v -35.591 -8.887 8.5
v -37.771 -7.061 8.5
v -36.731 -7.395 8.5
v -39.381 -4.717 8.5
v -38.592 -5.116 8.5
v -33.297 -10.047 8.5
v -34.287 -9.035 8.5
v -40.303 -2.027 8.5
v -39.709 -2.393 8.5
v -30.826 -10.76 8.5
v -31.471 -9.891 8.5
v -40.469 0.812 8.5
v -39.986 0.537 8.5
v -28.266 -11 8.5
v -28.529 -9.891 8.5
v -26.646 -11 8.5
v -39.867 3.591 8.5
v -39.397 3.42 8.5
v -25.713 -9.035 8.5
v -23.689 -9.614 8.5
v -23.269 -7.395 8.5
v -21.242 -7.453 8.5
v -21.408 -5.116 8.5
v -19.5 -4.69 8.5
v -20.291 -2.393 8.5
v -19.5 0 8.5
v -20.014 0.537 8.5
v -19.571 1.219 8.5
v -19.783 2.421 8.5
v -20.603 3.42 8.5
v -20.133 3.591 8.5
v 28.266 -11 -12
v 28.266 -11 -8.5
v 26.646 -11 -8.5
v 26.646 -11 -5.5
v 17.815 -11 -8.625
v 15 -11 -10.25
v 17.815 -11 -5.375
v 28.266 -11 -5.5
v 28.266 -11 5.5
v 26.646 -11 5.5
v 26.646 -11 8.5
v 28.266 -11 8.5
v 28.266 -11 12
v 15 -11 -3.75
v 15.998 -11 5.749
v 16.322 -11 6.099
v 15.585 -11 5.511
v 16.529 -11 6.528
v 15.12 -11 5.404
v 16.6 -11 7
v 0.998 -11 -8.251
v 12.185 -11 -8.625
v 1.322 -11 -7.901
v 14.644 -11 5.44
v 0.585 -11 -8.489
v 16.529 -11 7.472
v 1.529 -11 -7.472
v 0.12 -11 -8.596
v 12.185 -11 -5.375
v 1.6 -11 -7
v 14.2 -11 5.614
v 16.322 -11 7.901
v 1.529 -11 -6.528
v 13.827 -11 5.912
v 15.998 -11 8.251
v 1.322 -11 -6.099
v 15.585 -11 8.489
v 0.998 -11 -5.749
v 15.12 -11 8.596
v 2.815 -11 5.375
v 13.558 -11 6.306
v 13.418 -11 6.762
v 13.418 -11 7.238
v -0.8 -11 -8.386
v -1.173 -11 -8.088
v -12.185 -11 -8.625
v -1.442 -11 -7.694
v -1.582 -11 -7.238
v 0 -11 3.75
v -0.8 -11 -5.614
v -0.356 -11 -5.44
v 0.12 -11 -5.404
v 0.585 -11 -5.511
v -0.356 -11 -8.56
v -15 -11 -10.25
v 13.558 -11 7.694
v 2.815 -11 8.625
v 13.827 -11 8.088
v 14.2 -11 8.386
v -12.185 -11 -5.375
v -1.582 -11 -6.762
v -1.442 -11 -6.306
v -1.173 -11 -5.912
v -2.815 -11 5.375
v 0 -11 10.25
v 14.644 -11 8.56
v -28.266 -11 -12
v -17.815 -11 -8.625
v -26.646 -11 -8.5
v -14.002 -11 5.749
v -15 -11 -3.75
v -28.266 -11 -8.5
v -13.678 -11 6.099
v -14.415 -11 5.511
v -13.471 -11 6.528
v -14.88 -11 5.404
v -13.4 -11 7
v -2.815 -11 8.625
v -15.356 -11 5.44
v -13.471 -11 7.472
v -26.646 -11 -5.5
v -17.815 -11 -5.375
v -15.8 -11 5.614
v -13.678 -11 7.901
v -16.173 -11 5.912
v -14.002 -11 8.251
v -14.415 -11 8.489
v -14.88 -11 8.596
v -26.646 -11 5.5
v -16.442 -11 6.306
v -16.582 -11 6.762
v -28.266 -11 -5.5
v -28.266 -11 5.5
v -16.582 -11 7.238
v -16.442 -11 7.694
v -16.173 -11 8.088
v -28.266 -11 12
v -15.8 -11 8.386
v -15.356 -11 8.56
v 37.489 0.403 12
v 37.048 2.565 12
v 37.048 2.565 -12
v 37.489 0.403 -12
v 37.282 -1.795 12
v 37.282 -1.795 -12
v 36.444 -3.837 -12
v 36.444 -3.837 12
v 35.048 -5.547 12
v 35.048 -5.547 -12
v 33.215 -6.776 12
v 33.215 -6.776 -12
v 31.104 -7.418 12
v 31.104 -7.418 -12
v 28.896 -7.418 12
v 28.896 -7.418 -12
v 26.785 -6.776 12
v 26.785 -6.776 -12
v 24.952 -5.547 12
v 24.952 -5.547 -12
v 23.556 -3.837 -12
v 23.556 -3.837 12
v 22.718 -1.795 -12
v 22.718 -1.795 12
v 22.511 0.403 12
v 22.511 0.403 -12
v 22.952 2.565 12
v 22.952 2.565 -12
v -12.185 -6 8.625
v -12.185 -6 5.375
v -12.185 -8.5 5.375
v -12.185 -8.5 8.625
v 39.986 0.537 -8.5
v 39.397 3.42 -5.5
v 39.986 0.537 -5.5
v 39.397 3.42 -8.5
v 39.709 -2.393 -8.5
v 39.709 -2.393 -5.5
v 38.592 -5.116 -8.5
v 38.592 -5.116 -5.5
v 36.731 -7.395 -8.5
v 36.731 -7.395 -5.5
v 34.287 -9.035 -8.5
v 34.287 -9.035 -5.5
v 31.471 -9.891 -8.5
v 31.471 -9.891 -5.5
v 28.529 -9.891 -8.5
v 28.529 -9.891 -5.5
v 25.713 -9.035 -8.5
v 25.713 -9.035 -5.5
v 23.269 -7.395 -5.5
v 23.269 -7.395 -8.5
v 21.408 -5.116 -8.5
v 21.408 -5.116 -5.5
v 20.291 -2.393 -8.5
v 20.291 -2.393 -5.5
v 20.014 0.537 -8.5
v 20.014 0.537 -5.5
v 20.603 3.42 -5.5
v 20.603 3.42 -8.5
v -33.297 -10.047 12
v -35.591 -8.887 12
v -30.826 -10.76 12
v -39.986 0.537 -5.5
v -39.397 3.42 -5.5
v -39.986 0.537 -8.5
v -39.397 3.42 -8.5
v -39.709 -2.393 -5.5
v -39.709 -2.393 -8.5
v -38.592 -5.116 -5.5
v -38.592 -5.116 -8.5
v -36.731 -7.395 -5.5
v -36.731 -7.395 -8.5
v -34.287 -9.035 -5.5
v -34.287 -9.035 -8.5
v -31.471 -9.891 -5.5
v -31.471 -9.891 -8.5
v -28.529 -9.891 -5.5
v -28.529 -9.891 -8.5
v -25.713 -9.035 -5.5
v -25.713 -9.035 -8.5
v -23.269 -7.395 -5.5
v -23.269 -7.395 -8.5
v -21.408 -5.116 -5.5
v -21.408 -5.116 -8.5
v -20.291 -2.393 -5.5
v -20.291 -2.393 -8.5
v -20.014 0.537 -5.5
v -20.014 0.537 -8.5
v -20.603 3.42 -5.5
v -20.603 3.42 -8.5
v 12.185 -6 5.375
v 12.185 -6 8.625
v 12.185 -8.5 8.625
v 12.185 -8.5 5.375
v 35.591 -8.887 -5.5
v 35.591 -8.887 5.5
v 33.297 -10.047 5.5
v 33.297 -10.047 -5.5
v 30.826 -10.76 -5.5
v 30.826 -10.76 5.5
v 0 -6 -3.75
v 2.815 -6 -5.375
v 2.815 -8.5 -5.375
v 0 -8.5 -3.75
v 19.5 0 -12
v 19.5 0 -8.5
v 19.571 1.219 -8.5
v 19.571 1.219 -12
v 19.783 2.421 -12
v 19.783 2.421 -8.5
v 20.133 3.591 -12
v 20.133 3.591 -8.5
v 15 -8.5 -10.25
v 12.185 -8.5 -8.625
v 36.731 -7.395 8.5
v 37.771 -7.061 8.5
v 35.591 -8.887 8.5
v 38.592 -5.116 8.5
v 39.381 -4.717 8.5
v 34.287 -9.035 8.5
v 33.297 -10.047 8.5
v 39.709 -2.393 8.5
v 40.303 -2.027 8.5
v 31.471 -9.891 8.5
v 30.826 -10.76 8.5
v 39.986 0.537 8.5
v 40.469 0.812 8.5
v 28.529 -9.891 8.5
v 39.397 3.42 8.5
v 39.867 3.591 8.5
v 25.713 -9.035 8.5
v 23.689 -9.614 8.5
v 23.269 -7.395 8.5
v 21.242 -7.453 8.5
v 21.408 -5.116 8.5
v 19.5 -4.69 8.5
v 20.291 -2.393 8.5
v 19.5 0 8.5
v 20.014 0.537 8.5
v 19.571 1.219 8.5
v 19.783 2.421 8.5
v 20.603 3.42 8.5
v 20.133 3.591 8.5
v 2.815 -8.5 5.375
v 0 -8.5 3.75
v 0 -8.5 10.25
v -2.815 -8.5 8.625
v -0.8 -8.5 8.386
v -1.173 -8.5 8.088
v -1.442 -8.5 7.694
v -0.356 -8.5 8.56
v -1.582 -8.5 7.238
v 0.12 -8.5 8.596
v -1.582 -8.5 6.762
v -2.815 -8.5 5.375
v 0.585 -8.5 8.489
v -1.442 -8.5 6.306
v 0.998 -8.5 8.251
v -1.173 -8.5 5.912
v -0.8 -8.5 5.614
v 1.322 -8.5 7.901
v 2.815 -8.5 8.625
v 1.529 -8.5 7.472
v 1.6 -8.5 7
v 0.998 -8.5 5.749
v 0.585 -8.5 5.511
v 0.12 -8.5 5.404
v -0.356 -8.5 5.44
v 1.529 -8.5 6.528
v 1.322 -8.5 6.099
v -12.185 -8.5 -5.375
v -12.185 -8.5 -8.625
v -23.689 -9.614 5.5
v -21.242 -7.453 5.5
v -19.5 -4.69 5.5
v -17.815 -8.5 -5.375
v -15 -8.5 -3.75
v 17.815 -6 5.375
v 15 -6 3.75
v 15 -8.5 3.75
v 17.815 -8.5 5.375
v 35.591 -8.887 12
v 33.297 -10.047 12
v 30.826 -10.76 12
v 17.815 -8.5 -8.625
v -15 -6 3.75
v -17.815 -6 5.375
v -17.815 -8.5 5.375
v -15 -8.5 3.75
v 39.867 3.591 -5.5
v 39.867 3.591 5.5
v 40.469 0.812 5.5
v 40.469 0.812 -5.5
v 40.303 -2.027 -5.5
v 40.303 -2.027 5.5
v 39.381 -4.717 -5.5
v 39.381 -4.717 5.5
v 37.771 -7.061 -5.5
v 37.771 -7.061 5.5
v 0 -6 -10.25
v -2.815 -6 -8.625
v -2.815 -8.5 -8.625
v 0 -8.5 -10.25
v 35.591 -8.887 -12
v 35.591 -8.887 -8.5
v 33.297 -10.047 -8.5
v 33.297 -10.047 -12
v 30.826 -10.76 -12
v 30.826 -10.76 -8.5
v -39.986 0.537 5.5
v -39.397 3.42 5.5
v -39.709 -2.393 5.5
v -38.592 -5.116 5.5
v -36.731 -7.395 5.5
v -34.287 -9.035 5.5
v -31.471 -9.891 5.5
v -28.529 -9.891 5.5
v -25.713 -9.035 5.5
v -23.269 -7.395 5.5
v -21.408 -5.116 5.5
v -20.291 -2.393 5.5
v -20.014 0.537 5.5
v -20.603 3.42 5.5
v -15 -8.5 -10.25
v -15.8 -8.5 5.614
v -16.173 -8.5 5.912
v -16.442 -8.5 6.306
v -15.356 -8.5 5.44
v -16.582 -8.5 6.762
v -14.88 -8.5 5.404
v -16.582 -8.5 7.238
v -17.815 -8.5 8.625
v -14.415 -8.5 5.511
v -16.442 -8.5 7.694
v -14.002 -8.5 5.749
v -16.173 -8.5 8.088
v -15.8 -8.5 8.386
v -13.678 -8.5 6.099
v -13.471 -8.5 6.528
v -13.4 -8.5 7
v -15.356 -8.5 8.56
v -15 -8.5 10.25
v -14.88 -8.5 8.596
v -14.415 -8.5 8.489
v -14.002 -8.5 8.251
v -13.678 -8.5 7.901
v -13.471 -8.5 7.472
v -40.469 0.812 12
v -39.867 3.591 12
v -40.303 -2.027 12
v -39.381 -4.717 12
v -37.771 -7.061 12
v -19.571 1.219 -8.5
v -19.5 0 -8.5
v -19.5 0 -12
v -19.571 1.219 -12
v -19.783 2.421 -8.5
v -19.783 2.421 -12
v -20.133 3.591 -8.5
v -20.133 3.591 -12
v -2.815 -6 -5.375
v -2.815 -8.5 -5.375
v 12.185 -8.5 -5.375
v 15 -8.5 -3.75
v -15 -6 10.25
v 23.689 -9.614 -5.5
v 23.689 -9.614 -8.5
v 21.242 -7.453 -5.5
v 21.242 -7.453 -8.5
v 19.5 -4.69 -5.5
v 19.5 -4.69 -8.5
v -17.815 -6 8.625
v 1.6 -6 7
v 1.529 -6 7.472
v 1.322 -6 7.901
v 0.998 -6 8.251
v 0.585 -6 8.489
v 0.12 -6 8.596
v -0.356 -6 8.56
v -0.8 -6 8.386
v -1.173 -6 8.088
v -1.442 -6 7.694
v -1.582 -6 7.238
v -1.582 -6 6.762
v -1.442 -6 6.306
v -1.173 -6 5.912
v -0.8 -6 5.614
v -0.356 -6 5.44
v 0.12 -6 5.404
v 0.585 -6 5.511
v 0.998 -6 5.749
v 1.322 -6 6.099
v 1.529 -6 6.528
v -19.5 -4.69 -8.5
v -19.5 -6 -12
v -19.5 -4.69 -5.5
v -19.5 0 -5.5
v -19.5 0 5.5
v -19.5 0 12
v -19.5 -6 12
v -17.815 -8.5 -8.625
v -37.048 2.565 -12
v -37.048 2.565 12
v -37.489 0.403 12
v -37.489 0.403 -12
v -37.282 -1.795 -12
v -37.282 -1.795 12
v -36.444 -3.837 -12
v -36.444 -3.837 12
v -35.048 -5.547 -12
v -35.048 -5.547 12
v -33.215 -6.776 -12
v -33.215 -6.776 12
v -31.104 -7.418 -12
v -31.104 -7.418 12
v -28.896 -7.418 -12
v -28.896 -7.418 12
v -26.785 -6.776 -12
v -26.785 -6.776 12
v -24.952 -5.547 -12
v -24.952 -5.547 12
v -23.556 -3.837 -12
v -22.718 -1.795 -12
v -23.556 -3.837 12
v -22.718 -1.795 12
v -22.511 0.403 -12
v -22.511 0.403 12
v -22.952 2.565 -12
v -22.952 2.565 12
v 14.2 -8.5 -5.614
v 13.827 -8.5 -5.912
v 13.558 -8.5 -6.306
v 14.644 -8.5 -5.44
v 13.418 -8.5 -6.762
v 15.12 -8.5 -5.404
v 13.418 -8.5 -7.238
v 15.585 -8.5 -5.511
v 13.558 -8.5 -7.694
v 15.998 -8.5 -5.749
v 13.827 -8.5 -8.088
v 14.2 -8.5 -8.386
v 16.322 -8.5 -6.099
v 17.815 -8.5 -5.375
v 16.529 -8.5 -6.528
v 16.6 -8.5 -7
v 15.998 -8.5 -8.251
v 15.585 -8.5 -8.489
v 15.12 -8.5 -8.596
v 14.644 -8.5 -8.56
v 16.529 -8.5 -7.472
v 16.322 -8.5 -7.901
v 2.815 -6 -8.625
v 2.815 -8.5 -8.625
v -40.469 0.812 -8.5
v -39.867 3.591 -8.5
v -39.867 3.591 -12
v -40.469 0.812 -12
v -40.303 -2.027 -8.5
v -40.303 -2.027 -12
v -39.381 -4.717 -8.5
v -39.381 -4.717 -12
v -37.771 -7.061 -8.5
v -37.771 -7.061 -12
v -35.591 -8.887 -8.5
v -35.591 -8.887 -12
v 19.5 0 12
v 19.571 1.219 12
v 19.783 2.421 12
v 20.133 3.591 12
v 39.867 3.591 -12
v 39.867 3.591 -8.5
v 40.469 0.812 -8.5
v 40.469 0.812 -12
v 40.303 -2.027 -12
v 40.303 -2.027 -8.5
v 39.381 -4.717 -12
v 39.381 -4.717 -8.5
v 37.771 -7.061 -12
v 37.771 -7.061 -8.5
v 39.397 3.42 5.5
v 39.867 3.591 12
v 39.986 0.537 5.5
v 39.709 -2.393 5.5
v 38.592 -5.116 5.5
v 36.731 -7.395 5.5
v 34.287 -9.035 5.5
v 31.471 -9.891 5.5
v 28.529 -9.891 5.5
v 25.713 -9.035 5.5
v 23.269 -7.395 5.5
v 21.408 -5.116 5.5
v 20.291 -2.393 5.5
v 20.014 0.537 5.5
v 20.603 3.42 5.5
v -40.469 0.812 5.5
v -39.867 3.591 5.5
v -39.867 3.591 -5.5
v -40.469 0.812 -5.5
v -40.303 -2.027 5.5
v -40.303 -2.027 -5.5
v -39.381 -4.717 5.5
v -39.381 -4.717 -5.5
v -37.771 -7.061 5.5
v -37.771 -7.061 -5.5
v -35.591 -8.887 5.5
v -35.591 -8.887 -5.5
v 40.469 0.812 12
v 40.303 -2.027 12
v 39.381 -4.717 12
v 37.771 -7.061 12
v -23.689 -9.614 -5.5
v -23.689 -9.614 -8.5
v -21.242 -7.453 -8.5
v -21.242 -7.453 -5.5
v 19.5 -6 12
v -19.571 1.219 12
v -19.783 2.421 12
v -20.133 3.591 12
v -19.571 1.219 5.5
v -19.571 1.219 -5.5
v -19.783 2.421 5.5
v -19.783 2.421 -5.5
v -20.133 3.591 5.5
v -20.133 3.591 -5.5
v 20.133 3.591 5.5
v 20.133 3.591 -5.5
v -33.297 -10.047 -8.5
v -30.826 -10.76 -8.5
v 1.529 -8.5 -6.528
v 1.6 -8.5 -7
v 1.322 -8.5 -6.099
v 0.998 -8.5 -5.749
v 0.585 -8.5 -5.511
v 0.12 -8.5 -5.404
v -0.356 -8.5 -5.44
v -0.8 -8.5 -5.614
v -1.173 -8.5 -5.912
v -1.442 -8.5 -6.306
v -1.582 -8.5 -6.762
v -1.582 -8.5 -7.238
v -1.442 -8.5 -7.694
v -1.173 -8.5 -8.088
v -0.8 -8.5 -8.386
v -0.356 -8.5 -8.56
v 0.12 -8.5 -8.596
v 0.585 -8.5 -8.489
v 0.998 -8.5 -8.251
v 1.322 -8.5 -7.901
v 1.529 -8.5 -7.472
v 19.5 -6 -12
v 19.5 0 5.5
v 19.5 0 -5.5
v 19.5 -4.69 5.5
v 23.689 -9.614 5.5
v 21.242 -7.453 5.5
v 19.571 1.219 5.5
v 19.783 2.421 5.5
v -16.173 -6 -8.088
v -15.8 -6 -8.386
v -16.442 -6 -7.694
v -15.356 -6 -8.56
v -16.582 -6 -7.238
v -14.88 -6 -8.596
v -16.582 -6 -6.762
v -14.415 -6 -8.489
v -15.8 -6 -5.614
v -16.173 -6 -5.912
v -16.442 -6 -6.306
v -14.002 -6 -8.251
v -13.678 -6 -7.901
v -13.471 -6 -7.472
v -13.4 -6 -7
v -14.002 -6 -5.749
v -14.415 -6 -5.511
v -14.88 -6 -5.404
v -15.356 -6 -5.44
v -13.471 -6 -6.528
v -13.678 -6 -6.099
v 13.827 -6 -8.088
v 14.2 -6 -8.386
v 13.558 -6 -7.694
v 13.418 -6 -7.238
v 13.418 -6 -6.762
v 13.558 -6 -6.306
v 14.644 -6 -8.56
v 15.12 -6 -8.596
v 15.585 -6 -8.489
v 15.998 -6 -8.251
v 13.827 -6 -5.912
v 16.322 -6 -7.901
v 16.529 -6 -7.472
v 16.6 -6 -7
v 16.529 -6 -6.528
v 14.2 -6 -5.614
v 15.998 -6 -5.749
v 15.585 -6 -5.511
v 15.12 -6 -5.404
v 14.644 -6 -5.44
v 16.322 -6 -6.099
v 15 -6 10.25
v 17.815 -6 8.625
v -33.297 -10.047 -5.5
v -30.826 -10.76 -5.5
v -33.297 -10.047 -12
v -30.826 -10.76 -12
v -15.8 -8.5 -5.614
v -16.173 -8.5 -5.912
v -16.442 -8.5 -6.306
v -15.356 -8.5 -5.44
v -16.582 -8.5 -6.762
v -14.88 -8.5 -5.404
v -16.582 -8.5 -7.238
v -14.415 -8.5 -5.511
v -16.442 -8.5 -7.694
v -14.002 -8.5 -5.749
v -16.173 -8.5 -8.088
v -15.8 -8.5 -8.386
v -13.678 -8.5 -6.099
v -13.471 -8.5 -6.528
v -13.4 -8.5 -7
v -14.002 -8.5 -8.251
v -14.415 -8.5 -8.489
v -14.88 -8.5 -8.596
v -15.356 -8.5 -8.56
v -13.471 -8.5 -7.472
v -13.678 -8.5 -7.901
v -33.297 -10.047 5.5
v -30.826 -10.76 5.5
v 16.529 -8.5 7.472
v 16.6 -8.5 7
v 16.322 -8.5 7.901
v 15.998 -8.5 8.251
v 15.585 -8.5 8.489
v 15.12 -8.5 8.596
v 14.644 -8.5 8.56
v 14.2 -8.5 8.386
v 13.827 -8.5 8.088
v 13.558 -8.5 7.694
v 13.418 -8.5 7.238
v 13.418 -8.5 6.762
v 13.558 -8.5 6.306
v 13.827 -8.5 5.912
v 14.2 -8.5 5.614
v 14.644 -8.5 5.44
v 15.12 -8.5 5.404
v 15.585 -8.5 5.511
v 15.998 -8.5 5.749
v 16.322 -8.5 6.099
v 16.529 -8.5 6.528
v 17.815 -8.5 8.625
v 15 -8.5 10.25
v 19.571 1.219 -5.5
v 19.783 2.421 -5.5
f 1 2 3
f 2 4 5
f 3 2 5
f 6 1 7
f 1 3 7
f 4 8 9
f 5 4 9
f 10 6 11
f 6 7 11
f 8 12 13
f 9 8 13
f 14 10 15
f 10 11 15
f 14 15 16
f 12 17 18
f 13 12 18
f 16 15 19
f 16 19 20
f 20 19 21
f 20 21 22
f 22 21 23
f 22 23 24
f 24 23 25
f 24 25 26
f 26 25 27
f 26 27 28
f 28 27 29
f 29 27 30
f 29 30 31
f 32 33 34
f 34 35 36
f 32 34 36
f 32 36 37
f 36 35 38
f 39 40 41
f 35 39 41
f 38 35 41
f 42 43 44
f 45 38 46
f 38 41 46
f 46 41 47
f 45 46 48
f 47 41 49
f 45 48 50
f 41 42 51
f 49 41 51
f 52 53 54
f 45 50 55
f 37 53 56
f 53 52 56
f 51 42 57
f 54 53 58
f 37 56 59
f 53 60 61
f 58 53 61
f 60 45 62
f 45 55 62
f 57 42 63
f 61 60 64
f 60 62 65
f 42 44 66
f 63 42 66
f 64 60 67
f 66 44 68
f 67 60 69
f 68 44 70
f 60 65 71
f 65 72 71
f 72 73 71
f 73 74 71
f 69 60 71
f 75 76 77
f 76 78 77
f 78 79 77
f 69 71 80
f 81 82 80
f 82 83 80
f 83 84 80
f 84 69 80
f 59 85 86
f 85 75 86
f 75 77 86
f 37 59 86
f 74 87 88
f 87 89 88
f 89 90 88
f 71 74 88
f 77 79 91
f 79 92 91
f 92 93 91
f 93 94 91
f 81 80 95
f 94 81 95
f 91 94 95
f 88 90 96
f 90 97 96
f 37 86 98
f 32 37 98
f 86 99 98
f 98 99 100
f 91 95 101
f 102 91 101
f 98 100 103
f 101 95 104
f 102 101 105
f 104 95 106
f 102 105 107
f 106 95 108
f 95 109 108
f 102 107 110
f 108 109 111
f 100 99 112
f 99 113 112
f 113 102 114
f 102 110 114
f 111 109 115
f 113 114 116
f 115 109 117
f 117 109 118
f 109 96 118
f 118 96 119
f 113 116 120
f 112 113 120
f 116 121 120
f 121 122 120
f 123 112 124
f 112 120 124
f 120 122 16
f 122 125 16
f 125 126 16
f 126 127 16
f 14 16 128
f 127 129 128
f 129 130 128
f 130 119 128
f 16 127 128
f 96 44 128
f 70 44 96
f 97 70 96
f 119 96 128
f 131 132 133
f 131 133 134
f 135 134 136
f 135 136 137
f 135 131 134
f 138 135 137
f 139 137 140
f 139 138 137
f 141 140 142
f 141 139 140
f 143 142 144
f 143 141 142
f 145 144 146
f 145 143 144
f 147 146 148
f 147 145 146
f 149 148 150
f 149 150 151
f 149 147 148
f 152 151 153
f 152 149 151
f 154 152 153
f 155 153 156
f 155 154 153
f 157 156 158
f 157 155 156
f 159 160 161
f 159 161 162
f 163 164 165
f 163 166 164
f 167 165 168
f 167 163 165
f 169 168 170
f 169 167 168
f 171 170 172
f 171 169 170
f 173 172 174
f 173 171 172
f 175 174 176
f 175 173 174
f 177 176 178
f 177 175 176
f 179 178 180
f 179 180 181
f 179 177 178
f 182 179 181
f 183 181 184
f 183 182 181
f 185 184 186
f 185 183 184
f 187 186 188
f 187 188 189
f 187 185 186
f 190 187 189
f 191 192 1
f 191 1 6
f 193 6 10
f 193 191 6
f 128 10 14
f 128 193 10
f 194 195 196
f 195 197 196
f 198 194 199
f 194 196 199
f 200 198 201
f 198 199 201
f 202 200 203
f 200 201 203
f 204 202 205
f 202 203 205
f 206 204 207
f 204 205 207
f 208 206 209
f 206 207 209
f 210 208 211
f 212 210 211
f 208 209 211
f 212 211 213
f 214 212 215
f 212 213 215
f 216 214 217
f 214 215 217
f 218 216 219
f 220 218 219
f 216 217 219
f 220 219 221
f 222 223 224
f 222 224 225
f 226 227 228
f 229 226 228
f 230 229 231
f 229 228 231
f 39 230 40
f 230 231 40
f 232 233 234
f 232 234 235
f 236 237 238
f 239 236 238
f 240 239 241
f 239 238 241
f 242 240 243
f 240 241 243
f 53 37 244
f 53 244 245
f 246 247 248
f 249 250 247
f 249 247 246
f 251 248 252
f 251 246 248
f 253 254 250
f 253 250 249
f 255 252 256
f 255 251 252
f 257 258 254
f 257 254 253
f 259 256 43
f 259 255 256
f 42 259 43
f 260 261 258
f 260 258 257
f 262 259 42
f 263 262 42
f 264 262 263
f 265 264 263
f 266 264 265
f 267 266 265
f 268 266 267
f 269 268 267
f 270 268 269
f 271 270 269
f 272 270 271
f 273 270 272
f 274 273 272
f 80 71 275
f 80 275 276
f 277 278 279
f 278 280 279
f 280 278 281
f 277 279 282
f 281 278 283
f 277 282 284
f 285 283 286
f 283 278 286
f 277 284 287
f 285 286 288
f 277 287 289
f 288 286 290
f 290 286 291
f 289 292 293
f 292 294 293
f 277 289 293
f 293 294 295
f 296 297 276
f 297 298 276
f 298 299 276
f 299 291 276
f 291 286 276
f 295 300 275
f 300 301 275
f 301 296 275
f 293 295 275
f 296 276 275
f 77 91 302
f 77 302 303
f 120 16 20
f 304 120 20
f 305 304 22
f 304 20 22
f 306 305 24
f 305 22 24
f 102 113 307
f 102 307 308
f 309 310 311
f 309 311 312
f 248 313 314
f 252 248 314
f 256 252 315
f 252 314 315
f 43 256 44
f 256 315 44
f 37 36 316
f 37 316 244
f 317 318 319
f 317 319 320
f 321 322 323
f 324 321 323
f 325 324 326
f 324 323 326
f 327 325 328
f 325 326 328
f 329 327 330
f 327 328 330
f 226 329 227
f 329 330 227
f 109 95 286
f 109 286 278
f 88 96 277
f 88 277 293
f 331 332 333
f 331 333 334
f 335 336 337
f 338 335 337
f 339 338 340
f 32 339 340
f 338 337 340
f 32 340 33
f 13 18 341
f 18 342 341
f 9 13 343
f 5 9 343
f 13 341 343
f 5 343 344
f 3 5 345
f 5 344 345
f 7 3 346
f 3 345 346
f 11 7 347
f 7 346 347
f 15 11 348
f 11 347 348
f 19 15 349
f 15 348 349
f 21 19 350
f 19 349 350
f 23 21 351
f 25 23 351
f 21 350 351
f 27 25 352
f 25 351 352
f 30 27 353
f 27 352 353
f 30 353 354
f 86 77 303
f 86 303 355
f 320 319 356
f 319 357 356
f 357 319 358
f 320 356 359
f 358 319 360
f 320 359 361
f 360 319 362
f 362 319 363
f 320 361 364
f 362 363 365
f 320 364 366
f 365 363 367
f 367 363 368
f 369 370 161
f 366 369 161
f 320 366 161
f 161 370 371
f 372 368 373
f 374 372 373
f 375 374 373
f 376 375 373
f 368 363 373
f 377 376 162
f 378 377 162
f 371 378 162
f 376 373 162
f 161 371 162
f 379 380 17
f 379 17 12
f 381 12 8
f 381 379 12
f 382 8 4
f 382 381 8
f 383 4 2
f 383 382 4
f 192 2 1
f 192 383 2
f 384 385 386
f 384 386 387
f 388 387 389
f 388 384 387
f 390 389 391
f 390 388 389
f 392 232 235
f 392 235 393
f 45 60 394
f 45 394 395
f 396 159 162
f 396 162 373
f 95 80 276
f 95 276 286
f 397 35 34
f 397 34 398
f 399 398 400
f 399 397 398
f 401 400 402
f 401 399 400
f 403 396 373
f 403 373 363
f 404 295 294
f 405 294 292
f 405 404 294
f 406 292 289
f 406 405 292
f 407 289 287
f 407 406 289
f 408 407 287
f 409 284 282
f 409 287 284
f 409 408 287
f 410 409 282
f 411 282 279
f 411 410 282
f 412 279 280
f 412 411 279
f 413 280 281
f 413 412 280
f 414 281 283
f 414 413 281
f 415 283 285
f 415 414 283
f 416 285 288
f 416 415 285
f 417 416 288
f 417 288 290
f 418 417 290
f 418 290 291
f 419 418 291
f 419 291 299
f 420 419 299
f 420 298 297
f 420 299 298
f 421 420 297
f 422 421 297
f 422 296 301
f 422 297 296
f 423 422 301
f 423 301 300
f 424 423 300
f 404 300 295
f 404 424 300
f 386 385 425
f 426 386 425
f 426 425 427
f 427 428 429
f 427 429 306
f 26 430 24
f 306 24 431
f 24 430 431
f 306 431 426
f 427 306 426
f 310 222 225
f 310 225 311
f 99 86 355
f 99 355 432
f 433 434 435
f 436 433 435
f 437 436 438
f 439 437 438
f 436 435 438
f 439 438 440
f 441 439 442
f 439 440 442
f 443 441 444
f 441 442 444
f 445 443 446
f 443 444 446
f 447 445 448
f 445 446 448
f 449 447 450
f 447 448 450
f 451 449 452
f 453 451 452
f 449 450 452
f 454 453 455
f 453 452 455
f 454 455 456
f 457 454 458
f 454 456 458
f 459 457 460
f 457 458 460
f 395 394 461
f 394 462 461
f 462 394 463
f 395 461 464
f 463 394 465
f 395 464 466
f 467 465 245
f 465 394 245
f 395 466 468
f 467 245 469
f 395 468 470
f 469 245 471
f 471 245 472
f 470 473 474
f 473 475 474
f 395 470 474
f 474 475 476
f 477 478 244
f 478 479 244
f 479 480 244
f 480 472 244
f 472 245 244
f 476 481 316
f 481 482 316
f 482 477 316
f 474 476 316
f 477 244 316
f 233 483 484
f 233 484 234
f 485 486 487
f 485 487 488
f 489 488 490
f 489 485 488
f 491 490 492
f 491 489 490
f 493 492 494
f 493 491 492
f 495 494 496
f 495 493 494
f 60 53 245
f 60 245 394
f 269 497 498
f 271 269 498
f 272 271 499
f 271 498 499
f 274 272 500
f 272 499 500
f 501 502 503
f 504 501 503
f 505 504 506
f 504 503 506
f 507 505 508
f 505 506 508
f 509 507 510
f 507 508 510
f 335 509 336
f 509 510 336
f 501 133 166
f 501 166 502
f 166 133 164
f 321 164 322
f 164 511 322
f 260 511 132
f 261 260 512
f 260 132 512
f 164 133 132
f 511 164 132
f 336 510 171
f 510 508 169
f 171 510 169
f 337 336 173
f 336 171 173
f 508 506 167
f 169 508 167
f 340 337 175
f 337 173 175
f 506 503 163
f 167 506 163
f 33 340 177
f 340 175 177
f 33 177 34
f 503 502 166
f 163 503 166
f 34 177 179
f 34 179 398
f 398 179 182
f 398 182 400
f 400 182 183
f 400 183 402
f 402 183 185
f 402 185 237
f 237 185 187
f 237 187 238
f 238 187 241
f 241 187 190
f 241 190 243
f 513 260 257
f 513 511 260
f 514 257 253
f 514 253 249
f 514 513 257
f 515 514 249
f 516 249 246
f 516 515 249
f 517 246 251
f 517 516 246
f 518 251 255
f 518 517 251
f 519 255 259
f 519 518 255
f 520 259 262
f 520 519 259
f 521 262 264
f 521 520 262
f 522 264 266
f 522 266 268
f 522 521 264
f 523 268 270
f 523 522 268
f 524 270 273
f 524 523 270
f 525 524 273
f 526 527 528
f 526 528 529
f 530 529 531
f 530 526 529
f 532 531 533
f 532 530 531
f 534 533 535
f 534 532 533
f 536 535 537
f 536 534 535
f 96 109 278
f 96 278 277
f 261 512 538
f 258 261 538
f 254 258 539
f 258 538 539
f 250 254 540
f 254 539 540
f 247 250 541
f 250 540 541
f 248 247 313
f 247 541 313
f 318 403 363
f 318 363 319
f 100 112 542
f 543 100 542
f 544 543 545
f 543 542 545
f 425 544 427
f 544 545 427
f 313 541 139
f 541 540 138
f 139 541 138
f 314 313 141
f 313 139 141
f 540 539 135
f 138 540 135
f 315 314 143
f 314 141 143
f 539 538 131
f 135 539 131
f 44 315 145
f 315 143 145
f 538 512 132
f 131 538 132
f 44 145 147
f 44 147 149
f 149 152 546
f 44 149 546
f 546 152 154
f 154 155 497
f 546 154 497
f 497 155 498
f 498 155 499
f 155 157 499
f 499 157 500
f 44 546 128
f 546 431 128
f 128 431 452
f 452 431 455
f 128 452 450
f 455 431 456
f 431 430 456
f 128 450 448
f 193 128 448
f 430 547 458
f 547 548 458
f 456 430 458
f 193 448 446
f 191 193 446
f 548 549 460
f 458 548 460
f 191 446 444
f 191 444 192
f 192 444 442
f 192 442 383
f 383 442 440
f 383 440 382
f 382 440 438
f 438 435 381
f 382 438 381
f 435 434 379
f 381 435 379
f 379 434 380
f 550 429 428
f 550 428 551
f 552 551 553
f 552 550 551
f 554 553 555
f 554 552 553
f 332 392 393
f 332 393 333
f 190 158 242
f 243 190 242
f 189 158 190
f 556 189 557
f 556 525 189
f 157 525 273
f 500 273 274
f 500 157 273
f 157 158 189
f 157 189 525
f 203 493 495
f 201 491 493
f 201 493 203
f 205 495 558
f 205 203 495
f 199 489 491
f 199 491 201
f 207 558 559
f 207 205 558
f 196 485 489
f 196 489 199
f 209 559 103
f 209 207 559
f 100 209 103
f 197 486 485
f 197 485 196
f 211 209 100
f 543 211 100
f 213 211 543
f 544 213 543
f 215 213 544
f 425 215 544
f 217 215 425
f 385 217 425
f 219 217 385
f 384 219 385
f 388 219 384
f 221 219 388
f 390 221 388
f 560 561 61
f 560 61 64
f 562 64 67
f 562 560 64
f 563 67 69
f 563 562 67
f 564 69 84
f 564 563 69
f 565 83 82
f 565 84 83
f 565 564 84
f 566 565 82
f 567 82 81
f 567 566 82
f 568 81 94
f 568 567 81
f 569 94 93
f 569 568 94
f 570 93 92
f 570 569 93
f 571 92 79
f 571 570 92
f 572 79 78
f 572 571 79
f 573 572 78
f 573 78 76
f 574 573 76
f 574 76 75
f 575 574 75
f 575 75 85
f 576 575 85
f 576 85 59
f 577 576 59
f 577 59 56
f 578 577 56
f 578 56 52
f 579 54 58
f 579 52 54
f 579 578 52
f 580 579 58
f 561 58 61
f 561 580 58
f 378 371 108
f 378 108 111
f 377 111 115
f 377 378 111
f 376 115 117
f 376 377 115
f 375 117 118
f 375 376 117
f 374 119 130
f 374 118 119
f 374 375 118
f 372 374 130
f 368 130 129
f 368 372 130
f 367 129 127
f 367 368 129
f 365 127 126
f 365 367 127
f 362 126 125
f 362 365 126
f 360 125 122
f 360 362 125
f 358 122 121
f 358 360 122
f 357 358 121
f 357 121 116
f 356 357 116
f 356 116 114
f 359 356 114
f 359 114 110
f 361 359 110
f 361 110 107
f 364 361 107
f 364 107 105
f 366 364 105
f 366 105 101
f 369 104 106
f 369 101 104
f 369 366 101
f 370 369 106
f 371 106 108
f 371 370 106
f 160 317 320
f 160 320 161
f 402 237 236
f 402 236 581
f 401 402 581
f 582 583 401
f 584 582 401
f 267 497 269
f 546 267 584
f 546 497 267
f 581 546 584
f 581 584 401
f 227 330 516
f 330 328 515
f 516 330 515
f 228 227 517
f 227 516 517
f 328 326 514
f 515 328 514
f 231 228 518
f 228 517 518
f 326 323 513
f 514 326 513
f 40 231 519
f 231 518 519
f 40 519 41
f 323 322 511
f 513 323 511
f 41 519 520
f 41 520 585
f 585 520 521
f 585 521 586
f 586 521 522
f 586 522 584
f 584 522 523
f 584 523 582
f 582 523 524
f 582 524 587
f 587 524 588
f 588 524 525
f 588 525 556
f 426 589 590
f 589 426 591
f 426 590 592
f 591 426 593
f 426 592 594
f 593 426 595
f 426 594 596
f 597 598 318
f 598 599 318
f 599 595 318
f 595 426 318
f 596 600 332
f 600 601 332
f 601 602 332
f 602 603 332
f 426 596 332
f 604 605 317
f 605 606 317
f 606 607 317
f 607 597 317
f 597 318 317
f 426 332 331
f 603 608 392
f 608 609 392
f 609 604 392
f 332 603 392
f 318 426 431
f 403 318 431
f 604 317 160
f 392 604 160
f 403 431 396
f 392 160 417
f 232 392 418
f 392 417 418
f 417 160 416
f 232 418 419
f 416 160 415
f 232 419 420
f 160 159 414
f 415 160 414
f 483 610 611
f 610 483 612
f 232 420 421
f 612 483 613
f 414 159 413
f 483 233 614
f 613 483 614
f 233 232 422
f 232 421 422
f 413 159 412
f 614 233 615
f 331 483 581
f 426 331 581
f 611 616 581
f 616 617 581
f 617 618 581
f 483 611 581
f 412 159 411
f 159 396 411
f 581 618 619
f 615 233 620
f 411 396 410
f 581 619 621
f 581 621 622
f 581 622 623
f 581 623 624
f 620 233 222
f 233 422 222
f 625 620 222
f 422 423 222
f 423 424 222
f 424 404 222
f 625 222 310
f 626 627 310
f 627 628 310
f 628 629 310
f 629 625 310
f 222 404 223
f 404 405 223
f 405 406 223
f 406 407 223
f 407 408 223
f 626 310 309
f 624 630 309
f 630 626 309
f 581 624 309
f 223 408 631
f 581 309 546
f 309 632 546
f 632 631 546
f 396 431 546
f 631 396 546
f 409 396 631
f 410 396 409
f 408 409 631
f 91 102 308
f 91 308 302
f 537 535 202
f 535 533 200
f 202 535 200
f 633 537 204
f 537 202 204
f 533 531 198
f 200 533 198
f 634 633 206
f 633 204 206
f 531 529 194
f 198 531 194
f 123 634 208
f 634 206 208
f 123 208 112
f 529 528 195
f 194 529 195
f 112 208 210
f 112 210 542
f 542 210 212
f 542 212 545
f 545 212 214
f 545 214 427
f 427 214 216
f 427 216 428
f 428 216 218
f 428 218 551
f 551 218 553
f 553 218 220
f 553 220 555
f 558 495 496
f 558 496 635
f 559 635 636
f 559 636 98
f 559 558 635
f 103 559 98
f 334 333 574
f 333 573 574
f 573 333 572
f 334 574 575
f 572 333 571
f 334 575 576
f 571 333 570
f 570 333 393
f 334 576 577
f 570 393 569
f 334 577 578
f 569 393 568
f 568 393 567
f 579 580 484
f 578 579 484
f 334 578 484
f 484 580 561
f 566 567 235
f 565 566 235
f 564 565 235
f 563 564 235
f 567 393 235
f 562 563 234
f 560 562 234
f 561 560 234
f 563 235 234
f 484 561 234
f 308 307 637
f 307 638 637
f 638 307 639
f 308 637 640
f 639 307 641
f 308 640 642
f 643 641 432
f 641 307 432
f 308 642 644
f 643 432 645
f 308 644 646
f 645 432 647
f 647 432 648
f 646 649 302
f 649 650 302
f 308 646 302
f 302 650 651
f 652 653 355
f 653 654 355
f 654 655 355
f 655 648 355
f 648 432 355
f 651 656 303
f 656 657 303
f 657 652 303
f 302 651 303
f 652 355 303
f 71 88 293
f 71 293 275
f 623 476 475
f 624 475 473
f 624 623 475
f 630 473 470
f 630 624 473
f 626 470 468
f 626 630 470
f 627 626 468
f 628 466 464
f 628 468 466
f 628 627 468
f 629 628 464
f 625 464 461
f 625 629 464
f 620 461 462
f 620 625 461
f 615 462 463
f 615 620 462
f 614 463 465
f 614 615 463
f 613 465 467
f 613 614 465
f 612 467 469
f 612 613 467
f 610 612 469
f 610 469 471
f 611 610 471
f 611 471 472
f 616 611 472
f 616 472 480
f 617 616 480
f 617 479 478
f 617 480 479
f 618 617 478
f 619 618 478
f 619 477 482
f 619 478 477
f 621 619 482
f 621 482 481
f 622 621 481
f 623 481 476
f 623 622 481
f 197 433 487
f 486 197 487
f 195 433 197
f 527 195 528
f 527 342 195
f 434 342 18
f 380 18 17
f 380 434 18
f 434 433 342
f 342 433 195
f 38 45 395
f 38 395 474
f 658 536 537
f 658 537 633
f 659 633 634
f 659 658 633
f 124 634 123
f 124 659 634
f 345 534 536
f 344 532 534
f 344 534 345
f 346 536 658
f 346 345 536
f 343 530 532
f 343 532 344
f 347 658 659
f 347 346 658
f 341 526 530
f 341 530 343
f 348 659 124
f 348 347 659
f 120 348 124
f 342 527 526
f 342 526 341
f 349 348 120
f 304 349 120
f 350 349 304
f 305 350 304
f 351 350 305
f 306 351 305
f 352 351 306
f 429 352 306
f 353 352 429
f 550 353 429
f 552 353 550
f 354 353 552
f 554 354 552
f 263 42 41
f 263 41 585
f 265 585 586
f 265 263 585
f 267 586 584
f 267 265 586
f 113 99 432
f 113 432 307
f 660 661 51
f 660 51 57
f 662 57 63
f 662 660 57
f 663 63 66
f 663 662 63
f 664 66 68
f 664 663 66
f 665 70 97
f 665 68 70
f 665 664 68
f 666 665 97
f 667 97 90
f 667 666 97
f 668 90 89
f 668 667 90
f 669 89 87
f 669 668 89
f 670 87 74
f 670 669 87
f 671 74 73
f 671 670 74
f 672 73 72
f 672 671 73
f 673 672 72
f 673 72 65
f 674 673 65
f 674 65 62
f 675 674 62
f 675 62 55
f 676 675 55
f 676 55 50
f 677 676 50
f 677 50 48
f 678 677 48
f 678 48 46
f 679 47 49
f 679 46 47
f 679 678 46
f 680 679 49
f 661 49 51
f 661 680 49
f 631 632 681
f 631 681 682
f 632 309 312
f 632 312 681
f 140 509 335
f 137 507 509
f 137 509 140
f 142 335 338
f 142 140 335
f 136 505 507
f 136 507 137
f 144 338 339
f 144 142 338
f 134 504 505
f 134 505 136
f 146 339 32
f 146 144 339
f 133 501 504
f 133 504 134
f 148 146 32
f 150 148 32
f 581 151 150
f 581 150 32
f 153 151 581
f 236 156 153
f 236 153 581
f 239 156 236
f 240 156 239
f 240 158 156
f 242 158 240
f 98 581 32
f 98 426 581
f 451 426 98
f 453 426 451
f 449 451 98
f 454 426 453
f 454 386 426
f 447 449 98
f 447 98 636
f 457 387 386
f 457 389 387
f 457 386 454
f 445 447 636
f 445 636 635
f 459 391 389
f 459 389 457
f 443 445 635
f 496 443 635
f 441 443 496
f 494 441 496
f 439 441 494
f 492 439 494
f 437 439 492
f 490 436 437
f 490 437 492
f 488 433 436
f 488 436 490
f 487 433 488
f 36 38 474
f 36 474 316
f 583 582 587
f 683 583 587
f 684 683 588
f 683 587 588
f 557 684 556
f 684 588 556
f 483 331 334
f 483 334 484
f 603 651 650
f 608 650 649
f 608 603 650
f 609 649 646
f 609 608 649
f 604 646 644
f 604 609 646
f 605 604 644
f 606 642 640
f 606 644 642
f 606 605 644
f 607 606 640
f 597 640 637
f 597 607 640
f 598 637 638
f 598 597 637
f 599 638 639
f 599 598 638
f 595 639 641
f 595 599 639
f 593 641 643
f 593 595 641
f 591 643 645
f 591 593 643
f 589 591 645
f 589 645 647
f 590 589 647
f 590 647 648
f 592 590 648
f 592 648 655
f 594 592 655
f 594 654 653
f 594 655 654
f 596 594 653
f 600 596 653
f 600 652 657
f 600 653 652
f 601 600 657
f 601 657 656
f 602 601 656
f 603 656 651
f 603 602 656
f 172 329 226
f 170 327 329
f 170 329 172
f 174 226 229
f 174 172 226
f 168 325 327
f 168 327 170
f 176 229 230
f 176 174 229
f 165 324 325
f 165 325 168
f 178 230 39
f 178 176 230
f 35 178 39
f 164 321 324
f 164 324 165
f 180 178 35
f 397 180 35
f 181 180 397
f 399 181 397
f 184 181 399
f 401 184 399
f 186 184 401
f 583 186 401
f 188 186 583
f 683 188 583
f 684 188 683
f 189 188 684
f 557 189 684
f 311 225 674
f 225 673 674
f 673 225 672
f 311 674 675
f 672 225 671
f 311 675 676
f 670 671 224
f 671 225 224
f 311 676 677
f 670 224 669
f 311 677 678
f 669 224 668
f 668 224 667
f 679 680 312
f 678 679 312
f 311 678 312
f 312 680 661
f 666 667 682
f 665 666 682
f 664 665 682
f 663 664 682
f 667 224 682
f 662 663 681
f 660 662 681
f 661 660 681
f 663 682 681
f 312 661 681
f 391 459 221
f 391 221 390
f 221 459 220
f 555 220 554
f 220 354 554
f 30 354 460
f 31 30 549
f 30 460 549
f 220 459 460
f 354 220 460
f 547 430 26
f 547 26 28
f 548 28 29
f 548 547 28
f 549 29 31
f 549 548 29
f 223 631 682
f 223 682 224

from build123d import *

# Parameters (mm, degrees)
SKETCH002_R      = 1.6
PAD002_DEPTH     = 10
PAD001_DEPTH     = 2.5
CLONE_ROLL_ANGLE = 180
SKETCH003_R      = 11.5
SKETCH003_R_2    = 10
PAD003_DEPTH     = 1.5
PAD_DEPTH        = 12


with BuildPart() as pad002:
    # Sketch002 → Pad002 (new body)
    with BuildSketch(Plane.XZ.offset(6)):
        with Locations((-15, 7)):
            Circle(SKETCH002_R)
        with Locations((0, -7)):
            Circle(SKETCH002_R)
        with Locations((15, 7)):
            Circle(SKETCH002_R)
        with Locations((-15, -7)):
            Circle(SKETCH002_R)
        with Locations((0, 7)):
            Circle(SKETCH002_R)
        with Locations((15, -7)):
            Circle(SKETCH002_R)
    extrude(amount=PAD002_DEPTH)


with BuildPart() as pad001:
    # Sketch001 → Pad001 (new body)
    with BuildSketch(Plane.XZ.offset(6)):
        Polygon((-12.185417, 5.375), (-12.185417, 8.625), (-15, 10.25), (-17.814583, 8.625), (-17.814583, 5.375), (-15, 3.75), align=None)
        Polygon((2.814583, -8.625), (2.814583, -5.375), (0, -3.75), (-2.814583, -5.375), (-2.814583, -8.625), (0, -10.25), align=None)
        Polygon((17.814583, 5.375), (17.814583, 8.625), (15, 10.25), (12.185417, 8.625), (12.185417, 5.375), (15, 3.75), align=None)
    extrude(amount=PAD001_DEPTH)


with BuildPart() as fusion:
    # Clone base: copy of Pad001
    add(pad001.part)


with BuildPart() as fusion_1:
    # Clone roll: moved
    add(fusion.part.rotate(Axis((0, 0, 0), (1, 0, 0)), CLONE_ROLL_ANGLE))


with BuildPart() as fusion_2:
    # Clone placement: moved
    add(fusion_1.part.moved(Location((0, -17, 0))))

    # Fusion: union Pad002, Pad001
    add(pad002.part)
    add(pad001.part)


with BuildPart() as pad003:
    # Sketch003 → Pad003 (new body, symmetric)
    with BuildSketch(Plane.XY):
        with Locations((-30, 0)):
            Circle(SKETCH003_R)
        with Locations((-30, 0)):
            Circle(SKETCH003_R_2, mode=Mode.SUBTRACT)
    extrude(amount=PAD003_DEPTH, both=True)


with BuildPart() as clone_of_pad003:
    # Clone002 base: copy of Pad003
    add(pad003.part)


with BuildPart() as clone_of_pad003_1:
    # Clone002 placement: moved
    add(clone_of_pad003.part.moved(Location((0, 0, -7))))


with BuildPart() as fusion002:
    # Clone001 base: copy of Pad003
    add(pad003.part)


with BuildPart() as fusion002_1:
    # Clone001 placement: moved
    add(fusion002.part.moved(Location((0, 0, 7))))

    # Fusion002: union Clone of Pad003
    add(clone_of_pad003_1.part)


with BuildPart() as cut:
    # Sketch → Pad (new body, symmetric)
    with BuildSketch(Plane.XY):
        with BuildLine():
            ThreePointArc((-37.047695, 2.565151), (-30, -7.5), (-22.952305, 2.565151))
            Line((-22.952305, 2.565151), (-20.133227, 3.591212))
            ThreePointArc((-19.5, 0), (-19.659519, 1.823306), (-20.133227, 3.591212))
            Line((-19.5, 0), (-19.5, -6))
            Line((-19.5, -6), (0, -6))
            Line((0, -6), (0, -11))
            Line((0, -11), (-28.266296, -11))
            ThreePointArc((-35.591373, -8.887438), (-32.078109, -10.461312), (-28.266296, -11))
            ThreePointArc((-39.866773, 3.591212), (-39.933163, -3.403273), (-35.591373, -8.887438))
            Line((-37.047695, 2.565151), (-39.866773, 3.591212))
        make_face()
    extrude(amount=PAD_DEPTH, both=True)

    # Cut: cut Fusion002
    add(fusion002_1.part, mode=Mode.SUBTRACT)


with BuildPart() as cut001:
    # Part__Mirroring: instance of Cut
    add(cut.part.mirror(Plane(origin=(0, 0, 0), x_dir=(0, -1, 0), z_dir=(1, 0, 0))))

    # Fusion003: union Cut
    add(cut.part)

    # Cut001: cut Fusion
    add(fusion_2.part, mode=Mode.SUBTRACT)


solid = cut001.part
